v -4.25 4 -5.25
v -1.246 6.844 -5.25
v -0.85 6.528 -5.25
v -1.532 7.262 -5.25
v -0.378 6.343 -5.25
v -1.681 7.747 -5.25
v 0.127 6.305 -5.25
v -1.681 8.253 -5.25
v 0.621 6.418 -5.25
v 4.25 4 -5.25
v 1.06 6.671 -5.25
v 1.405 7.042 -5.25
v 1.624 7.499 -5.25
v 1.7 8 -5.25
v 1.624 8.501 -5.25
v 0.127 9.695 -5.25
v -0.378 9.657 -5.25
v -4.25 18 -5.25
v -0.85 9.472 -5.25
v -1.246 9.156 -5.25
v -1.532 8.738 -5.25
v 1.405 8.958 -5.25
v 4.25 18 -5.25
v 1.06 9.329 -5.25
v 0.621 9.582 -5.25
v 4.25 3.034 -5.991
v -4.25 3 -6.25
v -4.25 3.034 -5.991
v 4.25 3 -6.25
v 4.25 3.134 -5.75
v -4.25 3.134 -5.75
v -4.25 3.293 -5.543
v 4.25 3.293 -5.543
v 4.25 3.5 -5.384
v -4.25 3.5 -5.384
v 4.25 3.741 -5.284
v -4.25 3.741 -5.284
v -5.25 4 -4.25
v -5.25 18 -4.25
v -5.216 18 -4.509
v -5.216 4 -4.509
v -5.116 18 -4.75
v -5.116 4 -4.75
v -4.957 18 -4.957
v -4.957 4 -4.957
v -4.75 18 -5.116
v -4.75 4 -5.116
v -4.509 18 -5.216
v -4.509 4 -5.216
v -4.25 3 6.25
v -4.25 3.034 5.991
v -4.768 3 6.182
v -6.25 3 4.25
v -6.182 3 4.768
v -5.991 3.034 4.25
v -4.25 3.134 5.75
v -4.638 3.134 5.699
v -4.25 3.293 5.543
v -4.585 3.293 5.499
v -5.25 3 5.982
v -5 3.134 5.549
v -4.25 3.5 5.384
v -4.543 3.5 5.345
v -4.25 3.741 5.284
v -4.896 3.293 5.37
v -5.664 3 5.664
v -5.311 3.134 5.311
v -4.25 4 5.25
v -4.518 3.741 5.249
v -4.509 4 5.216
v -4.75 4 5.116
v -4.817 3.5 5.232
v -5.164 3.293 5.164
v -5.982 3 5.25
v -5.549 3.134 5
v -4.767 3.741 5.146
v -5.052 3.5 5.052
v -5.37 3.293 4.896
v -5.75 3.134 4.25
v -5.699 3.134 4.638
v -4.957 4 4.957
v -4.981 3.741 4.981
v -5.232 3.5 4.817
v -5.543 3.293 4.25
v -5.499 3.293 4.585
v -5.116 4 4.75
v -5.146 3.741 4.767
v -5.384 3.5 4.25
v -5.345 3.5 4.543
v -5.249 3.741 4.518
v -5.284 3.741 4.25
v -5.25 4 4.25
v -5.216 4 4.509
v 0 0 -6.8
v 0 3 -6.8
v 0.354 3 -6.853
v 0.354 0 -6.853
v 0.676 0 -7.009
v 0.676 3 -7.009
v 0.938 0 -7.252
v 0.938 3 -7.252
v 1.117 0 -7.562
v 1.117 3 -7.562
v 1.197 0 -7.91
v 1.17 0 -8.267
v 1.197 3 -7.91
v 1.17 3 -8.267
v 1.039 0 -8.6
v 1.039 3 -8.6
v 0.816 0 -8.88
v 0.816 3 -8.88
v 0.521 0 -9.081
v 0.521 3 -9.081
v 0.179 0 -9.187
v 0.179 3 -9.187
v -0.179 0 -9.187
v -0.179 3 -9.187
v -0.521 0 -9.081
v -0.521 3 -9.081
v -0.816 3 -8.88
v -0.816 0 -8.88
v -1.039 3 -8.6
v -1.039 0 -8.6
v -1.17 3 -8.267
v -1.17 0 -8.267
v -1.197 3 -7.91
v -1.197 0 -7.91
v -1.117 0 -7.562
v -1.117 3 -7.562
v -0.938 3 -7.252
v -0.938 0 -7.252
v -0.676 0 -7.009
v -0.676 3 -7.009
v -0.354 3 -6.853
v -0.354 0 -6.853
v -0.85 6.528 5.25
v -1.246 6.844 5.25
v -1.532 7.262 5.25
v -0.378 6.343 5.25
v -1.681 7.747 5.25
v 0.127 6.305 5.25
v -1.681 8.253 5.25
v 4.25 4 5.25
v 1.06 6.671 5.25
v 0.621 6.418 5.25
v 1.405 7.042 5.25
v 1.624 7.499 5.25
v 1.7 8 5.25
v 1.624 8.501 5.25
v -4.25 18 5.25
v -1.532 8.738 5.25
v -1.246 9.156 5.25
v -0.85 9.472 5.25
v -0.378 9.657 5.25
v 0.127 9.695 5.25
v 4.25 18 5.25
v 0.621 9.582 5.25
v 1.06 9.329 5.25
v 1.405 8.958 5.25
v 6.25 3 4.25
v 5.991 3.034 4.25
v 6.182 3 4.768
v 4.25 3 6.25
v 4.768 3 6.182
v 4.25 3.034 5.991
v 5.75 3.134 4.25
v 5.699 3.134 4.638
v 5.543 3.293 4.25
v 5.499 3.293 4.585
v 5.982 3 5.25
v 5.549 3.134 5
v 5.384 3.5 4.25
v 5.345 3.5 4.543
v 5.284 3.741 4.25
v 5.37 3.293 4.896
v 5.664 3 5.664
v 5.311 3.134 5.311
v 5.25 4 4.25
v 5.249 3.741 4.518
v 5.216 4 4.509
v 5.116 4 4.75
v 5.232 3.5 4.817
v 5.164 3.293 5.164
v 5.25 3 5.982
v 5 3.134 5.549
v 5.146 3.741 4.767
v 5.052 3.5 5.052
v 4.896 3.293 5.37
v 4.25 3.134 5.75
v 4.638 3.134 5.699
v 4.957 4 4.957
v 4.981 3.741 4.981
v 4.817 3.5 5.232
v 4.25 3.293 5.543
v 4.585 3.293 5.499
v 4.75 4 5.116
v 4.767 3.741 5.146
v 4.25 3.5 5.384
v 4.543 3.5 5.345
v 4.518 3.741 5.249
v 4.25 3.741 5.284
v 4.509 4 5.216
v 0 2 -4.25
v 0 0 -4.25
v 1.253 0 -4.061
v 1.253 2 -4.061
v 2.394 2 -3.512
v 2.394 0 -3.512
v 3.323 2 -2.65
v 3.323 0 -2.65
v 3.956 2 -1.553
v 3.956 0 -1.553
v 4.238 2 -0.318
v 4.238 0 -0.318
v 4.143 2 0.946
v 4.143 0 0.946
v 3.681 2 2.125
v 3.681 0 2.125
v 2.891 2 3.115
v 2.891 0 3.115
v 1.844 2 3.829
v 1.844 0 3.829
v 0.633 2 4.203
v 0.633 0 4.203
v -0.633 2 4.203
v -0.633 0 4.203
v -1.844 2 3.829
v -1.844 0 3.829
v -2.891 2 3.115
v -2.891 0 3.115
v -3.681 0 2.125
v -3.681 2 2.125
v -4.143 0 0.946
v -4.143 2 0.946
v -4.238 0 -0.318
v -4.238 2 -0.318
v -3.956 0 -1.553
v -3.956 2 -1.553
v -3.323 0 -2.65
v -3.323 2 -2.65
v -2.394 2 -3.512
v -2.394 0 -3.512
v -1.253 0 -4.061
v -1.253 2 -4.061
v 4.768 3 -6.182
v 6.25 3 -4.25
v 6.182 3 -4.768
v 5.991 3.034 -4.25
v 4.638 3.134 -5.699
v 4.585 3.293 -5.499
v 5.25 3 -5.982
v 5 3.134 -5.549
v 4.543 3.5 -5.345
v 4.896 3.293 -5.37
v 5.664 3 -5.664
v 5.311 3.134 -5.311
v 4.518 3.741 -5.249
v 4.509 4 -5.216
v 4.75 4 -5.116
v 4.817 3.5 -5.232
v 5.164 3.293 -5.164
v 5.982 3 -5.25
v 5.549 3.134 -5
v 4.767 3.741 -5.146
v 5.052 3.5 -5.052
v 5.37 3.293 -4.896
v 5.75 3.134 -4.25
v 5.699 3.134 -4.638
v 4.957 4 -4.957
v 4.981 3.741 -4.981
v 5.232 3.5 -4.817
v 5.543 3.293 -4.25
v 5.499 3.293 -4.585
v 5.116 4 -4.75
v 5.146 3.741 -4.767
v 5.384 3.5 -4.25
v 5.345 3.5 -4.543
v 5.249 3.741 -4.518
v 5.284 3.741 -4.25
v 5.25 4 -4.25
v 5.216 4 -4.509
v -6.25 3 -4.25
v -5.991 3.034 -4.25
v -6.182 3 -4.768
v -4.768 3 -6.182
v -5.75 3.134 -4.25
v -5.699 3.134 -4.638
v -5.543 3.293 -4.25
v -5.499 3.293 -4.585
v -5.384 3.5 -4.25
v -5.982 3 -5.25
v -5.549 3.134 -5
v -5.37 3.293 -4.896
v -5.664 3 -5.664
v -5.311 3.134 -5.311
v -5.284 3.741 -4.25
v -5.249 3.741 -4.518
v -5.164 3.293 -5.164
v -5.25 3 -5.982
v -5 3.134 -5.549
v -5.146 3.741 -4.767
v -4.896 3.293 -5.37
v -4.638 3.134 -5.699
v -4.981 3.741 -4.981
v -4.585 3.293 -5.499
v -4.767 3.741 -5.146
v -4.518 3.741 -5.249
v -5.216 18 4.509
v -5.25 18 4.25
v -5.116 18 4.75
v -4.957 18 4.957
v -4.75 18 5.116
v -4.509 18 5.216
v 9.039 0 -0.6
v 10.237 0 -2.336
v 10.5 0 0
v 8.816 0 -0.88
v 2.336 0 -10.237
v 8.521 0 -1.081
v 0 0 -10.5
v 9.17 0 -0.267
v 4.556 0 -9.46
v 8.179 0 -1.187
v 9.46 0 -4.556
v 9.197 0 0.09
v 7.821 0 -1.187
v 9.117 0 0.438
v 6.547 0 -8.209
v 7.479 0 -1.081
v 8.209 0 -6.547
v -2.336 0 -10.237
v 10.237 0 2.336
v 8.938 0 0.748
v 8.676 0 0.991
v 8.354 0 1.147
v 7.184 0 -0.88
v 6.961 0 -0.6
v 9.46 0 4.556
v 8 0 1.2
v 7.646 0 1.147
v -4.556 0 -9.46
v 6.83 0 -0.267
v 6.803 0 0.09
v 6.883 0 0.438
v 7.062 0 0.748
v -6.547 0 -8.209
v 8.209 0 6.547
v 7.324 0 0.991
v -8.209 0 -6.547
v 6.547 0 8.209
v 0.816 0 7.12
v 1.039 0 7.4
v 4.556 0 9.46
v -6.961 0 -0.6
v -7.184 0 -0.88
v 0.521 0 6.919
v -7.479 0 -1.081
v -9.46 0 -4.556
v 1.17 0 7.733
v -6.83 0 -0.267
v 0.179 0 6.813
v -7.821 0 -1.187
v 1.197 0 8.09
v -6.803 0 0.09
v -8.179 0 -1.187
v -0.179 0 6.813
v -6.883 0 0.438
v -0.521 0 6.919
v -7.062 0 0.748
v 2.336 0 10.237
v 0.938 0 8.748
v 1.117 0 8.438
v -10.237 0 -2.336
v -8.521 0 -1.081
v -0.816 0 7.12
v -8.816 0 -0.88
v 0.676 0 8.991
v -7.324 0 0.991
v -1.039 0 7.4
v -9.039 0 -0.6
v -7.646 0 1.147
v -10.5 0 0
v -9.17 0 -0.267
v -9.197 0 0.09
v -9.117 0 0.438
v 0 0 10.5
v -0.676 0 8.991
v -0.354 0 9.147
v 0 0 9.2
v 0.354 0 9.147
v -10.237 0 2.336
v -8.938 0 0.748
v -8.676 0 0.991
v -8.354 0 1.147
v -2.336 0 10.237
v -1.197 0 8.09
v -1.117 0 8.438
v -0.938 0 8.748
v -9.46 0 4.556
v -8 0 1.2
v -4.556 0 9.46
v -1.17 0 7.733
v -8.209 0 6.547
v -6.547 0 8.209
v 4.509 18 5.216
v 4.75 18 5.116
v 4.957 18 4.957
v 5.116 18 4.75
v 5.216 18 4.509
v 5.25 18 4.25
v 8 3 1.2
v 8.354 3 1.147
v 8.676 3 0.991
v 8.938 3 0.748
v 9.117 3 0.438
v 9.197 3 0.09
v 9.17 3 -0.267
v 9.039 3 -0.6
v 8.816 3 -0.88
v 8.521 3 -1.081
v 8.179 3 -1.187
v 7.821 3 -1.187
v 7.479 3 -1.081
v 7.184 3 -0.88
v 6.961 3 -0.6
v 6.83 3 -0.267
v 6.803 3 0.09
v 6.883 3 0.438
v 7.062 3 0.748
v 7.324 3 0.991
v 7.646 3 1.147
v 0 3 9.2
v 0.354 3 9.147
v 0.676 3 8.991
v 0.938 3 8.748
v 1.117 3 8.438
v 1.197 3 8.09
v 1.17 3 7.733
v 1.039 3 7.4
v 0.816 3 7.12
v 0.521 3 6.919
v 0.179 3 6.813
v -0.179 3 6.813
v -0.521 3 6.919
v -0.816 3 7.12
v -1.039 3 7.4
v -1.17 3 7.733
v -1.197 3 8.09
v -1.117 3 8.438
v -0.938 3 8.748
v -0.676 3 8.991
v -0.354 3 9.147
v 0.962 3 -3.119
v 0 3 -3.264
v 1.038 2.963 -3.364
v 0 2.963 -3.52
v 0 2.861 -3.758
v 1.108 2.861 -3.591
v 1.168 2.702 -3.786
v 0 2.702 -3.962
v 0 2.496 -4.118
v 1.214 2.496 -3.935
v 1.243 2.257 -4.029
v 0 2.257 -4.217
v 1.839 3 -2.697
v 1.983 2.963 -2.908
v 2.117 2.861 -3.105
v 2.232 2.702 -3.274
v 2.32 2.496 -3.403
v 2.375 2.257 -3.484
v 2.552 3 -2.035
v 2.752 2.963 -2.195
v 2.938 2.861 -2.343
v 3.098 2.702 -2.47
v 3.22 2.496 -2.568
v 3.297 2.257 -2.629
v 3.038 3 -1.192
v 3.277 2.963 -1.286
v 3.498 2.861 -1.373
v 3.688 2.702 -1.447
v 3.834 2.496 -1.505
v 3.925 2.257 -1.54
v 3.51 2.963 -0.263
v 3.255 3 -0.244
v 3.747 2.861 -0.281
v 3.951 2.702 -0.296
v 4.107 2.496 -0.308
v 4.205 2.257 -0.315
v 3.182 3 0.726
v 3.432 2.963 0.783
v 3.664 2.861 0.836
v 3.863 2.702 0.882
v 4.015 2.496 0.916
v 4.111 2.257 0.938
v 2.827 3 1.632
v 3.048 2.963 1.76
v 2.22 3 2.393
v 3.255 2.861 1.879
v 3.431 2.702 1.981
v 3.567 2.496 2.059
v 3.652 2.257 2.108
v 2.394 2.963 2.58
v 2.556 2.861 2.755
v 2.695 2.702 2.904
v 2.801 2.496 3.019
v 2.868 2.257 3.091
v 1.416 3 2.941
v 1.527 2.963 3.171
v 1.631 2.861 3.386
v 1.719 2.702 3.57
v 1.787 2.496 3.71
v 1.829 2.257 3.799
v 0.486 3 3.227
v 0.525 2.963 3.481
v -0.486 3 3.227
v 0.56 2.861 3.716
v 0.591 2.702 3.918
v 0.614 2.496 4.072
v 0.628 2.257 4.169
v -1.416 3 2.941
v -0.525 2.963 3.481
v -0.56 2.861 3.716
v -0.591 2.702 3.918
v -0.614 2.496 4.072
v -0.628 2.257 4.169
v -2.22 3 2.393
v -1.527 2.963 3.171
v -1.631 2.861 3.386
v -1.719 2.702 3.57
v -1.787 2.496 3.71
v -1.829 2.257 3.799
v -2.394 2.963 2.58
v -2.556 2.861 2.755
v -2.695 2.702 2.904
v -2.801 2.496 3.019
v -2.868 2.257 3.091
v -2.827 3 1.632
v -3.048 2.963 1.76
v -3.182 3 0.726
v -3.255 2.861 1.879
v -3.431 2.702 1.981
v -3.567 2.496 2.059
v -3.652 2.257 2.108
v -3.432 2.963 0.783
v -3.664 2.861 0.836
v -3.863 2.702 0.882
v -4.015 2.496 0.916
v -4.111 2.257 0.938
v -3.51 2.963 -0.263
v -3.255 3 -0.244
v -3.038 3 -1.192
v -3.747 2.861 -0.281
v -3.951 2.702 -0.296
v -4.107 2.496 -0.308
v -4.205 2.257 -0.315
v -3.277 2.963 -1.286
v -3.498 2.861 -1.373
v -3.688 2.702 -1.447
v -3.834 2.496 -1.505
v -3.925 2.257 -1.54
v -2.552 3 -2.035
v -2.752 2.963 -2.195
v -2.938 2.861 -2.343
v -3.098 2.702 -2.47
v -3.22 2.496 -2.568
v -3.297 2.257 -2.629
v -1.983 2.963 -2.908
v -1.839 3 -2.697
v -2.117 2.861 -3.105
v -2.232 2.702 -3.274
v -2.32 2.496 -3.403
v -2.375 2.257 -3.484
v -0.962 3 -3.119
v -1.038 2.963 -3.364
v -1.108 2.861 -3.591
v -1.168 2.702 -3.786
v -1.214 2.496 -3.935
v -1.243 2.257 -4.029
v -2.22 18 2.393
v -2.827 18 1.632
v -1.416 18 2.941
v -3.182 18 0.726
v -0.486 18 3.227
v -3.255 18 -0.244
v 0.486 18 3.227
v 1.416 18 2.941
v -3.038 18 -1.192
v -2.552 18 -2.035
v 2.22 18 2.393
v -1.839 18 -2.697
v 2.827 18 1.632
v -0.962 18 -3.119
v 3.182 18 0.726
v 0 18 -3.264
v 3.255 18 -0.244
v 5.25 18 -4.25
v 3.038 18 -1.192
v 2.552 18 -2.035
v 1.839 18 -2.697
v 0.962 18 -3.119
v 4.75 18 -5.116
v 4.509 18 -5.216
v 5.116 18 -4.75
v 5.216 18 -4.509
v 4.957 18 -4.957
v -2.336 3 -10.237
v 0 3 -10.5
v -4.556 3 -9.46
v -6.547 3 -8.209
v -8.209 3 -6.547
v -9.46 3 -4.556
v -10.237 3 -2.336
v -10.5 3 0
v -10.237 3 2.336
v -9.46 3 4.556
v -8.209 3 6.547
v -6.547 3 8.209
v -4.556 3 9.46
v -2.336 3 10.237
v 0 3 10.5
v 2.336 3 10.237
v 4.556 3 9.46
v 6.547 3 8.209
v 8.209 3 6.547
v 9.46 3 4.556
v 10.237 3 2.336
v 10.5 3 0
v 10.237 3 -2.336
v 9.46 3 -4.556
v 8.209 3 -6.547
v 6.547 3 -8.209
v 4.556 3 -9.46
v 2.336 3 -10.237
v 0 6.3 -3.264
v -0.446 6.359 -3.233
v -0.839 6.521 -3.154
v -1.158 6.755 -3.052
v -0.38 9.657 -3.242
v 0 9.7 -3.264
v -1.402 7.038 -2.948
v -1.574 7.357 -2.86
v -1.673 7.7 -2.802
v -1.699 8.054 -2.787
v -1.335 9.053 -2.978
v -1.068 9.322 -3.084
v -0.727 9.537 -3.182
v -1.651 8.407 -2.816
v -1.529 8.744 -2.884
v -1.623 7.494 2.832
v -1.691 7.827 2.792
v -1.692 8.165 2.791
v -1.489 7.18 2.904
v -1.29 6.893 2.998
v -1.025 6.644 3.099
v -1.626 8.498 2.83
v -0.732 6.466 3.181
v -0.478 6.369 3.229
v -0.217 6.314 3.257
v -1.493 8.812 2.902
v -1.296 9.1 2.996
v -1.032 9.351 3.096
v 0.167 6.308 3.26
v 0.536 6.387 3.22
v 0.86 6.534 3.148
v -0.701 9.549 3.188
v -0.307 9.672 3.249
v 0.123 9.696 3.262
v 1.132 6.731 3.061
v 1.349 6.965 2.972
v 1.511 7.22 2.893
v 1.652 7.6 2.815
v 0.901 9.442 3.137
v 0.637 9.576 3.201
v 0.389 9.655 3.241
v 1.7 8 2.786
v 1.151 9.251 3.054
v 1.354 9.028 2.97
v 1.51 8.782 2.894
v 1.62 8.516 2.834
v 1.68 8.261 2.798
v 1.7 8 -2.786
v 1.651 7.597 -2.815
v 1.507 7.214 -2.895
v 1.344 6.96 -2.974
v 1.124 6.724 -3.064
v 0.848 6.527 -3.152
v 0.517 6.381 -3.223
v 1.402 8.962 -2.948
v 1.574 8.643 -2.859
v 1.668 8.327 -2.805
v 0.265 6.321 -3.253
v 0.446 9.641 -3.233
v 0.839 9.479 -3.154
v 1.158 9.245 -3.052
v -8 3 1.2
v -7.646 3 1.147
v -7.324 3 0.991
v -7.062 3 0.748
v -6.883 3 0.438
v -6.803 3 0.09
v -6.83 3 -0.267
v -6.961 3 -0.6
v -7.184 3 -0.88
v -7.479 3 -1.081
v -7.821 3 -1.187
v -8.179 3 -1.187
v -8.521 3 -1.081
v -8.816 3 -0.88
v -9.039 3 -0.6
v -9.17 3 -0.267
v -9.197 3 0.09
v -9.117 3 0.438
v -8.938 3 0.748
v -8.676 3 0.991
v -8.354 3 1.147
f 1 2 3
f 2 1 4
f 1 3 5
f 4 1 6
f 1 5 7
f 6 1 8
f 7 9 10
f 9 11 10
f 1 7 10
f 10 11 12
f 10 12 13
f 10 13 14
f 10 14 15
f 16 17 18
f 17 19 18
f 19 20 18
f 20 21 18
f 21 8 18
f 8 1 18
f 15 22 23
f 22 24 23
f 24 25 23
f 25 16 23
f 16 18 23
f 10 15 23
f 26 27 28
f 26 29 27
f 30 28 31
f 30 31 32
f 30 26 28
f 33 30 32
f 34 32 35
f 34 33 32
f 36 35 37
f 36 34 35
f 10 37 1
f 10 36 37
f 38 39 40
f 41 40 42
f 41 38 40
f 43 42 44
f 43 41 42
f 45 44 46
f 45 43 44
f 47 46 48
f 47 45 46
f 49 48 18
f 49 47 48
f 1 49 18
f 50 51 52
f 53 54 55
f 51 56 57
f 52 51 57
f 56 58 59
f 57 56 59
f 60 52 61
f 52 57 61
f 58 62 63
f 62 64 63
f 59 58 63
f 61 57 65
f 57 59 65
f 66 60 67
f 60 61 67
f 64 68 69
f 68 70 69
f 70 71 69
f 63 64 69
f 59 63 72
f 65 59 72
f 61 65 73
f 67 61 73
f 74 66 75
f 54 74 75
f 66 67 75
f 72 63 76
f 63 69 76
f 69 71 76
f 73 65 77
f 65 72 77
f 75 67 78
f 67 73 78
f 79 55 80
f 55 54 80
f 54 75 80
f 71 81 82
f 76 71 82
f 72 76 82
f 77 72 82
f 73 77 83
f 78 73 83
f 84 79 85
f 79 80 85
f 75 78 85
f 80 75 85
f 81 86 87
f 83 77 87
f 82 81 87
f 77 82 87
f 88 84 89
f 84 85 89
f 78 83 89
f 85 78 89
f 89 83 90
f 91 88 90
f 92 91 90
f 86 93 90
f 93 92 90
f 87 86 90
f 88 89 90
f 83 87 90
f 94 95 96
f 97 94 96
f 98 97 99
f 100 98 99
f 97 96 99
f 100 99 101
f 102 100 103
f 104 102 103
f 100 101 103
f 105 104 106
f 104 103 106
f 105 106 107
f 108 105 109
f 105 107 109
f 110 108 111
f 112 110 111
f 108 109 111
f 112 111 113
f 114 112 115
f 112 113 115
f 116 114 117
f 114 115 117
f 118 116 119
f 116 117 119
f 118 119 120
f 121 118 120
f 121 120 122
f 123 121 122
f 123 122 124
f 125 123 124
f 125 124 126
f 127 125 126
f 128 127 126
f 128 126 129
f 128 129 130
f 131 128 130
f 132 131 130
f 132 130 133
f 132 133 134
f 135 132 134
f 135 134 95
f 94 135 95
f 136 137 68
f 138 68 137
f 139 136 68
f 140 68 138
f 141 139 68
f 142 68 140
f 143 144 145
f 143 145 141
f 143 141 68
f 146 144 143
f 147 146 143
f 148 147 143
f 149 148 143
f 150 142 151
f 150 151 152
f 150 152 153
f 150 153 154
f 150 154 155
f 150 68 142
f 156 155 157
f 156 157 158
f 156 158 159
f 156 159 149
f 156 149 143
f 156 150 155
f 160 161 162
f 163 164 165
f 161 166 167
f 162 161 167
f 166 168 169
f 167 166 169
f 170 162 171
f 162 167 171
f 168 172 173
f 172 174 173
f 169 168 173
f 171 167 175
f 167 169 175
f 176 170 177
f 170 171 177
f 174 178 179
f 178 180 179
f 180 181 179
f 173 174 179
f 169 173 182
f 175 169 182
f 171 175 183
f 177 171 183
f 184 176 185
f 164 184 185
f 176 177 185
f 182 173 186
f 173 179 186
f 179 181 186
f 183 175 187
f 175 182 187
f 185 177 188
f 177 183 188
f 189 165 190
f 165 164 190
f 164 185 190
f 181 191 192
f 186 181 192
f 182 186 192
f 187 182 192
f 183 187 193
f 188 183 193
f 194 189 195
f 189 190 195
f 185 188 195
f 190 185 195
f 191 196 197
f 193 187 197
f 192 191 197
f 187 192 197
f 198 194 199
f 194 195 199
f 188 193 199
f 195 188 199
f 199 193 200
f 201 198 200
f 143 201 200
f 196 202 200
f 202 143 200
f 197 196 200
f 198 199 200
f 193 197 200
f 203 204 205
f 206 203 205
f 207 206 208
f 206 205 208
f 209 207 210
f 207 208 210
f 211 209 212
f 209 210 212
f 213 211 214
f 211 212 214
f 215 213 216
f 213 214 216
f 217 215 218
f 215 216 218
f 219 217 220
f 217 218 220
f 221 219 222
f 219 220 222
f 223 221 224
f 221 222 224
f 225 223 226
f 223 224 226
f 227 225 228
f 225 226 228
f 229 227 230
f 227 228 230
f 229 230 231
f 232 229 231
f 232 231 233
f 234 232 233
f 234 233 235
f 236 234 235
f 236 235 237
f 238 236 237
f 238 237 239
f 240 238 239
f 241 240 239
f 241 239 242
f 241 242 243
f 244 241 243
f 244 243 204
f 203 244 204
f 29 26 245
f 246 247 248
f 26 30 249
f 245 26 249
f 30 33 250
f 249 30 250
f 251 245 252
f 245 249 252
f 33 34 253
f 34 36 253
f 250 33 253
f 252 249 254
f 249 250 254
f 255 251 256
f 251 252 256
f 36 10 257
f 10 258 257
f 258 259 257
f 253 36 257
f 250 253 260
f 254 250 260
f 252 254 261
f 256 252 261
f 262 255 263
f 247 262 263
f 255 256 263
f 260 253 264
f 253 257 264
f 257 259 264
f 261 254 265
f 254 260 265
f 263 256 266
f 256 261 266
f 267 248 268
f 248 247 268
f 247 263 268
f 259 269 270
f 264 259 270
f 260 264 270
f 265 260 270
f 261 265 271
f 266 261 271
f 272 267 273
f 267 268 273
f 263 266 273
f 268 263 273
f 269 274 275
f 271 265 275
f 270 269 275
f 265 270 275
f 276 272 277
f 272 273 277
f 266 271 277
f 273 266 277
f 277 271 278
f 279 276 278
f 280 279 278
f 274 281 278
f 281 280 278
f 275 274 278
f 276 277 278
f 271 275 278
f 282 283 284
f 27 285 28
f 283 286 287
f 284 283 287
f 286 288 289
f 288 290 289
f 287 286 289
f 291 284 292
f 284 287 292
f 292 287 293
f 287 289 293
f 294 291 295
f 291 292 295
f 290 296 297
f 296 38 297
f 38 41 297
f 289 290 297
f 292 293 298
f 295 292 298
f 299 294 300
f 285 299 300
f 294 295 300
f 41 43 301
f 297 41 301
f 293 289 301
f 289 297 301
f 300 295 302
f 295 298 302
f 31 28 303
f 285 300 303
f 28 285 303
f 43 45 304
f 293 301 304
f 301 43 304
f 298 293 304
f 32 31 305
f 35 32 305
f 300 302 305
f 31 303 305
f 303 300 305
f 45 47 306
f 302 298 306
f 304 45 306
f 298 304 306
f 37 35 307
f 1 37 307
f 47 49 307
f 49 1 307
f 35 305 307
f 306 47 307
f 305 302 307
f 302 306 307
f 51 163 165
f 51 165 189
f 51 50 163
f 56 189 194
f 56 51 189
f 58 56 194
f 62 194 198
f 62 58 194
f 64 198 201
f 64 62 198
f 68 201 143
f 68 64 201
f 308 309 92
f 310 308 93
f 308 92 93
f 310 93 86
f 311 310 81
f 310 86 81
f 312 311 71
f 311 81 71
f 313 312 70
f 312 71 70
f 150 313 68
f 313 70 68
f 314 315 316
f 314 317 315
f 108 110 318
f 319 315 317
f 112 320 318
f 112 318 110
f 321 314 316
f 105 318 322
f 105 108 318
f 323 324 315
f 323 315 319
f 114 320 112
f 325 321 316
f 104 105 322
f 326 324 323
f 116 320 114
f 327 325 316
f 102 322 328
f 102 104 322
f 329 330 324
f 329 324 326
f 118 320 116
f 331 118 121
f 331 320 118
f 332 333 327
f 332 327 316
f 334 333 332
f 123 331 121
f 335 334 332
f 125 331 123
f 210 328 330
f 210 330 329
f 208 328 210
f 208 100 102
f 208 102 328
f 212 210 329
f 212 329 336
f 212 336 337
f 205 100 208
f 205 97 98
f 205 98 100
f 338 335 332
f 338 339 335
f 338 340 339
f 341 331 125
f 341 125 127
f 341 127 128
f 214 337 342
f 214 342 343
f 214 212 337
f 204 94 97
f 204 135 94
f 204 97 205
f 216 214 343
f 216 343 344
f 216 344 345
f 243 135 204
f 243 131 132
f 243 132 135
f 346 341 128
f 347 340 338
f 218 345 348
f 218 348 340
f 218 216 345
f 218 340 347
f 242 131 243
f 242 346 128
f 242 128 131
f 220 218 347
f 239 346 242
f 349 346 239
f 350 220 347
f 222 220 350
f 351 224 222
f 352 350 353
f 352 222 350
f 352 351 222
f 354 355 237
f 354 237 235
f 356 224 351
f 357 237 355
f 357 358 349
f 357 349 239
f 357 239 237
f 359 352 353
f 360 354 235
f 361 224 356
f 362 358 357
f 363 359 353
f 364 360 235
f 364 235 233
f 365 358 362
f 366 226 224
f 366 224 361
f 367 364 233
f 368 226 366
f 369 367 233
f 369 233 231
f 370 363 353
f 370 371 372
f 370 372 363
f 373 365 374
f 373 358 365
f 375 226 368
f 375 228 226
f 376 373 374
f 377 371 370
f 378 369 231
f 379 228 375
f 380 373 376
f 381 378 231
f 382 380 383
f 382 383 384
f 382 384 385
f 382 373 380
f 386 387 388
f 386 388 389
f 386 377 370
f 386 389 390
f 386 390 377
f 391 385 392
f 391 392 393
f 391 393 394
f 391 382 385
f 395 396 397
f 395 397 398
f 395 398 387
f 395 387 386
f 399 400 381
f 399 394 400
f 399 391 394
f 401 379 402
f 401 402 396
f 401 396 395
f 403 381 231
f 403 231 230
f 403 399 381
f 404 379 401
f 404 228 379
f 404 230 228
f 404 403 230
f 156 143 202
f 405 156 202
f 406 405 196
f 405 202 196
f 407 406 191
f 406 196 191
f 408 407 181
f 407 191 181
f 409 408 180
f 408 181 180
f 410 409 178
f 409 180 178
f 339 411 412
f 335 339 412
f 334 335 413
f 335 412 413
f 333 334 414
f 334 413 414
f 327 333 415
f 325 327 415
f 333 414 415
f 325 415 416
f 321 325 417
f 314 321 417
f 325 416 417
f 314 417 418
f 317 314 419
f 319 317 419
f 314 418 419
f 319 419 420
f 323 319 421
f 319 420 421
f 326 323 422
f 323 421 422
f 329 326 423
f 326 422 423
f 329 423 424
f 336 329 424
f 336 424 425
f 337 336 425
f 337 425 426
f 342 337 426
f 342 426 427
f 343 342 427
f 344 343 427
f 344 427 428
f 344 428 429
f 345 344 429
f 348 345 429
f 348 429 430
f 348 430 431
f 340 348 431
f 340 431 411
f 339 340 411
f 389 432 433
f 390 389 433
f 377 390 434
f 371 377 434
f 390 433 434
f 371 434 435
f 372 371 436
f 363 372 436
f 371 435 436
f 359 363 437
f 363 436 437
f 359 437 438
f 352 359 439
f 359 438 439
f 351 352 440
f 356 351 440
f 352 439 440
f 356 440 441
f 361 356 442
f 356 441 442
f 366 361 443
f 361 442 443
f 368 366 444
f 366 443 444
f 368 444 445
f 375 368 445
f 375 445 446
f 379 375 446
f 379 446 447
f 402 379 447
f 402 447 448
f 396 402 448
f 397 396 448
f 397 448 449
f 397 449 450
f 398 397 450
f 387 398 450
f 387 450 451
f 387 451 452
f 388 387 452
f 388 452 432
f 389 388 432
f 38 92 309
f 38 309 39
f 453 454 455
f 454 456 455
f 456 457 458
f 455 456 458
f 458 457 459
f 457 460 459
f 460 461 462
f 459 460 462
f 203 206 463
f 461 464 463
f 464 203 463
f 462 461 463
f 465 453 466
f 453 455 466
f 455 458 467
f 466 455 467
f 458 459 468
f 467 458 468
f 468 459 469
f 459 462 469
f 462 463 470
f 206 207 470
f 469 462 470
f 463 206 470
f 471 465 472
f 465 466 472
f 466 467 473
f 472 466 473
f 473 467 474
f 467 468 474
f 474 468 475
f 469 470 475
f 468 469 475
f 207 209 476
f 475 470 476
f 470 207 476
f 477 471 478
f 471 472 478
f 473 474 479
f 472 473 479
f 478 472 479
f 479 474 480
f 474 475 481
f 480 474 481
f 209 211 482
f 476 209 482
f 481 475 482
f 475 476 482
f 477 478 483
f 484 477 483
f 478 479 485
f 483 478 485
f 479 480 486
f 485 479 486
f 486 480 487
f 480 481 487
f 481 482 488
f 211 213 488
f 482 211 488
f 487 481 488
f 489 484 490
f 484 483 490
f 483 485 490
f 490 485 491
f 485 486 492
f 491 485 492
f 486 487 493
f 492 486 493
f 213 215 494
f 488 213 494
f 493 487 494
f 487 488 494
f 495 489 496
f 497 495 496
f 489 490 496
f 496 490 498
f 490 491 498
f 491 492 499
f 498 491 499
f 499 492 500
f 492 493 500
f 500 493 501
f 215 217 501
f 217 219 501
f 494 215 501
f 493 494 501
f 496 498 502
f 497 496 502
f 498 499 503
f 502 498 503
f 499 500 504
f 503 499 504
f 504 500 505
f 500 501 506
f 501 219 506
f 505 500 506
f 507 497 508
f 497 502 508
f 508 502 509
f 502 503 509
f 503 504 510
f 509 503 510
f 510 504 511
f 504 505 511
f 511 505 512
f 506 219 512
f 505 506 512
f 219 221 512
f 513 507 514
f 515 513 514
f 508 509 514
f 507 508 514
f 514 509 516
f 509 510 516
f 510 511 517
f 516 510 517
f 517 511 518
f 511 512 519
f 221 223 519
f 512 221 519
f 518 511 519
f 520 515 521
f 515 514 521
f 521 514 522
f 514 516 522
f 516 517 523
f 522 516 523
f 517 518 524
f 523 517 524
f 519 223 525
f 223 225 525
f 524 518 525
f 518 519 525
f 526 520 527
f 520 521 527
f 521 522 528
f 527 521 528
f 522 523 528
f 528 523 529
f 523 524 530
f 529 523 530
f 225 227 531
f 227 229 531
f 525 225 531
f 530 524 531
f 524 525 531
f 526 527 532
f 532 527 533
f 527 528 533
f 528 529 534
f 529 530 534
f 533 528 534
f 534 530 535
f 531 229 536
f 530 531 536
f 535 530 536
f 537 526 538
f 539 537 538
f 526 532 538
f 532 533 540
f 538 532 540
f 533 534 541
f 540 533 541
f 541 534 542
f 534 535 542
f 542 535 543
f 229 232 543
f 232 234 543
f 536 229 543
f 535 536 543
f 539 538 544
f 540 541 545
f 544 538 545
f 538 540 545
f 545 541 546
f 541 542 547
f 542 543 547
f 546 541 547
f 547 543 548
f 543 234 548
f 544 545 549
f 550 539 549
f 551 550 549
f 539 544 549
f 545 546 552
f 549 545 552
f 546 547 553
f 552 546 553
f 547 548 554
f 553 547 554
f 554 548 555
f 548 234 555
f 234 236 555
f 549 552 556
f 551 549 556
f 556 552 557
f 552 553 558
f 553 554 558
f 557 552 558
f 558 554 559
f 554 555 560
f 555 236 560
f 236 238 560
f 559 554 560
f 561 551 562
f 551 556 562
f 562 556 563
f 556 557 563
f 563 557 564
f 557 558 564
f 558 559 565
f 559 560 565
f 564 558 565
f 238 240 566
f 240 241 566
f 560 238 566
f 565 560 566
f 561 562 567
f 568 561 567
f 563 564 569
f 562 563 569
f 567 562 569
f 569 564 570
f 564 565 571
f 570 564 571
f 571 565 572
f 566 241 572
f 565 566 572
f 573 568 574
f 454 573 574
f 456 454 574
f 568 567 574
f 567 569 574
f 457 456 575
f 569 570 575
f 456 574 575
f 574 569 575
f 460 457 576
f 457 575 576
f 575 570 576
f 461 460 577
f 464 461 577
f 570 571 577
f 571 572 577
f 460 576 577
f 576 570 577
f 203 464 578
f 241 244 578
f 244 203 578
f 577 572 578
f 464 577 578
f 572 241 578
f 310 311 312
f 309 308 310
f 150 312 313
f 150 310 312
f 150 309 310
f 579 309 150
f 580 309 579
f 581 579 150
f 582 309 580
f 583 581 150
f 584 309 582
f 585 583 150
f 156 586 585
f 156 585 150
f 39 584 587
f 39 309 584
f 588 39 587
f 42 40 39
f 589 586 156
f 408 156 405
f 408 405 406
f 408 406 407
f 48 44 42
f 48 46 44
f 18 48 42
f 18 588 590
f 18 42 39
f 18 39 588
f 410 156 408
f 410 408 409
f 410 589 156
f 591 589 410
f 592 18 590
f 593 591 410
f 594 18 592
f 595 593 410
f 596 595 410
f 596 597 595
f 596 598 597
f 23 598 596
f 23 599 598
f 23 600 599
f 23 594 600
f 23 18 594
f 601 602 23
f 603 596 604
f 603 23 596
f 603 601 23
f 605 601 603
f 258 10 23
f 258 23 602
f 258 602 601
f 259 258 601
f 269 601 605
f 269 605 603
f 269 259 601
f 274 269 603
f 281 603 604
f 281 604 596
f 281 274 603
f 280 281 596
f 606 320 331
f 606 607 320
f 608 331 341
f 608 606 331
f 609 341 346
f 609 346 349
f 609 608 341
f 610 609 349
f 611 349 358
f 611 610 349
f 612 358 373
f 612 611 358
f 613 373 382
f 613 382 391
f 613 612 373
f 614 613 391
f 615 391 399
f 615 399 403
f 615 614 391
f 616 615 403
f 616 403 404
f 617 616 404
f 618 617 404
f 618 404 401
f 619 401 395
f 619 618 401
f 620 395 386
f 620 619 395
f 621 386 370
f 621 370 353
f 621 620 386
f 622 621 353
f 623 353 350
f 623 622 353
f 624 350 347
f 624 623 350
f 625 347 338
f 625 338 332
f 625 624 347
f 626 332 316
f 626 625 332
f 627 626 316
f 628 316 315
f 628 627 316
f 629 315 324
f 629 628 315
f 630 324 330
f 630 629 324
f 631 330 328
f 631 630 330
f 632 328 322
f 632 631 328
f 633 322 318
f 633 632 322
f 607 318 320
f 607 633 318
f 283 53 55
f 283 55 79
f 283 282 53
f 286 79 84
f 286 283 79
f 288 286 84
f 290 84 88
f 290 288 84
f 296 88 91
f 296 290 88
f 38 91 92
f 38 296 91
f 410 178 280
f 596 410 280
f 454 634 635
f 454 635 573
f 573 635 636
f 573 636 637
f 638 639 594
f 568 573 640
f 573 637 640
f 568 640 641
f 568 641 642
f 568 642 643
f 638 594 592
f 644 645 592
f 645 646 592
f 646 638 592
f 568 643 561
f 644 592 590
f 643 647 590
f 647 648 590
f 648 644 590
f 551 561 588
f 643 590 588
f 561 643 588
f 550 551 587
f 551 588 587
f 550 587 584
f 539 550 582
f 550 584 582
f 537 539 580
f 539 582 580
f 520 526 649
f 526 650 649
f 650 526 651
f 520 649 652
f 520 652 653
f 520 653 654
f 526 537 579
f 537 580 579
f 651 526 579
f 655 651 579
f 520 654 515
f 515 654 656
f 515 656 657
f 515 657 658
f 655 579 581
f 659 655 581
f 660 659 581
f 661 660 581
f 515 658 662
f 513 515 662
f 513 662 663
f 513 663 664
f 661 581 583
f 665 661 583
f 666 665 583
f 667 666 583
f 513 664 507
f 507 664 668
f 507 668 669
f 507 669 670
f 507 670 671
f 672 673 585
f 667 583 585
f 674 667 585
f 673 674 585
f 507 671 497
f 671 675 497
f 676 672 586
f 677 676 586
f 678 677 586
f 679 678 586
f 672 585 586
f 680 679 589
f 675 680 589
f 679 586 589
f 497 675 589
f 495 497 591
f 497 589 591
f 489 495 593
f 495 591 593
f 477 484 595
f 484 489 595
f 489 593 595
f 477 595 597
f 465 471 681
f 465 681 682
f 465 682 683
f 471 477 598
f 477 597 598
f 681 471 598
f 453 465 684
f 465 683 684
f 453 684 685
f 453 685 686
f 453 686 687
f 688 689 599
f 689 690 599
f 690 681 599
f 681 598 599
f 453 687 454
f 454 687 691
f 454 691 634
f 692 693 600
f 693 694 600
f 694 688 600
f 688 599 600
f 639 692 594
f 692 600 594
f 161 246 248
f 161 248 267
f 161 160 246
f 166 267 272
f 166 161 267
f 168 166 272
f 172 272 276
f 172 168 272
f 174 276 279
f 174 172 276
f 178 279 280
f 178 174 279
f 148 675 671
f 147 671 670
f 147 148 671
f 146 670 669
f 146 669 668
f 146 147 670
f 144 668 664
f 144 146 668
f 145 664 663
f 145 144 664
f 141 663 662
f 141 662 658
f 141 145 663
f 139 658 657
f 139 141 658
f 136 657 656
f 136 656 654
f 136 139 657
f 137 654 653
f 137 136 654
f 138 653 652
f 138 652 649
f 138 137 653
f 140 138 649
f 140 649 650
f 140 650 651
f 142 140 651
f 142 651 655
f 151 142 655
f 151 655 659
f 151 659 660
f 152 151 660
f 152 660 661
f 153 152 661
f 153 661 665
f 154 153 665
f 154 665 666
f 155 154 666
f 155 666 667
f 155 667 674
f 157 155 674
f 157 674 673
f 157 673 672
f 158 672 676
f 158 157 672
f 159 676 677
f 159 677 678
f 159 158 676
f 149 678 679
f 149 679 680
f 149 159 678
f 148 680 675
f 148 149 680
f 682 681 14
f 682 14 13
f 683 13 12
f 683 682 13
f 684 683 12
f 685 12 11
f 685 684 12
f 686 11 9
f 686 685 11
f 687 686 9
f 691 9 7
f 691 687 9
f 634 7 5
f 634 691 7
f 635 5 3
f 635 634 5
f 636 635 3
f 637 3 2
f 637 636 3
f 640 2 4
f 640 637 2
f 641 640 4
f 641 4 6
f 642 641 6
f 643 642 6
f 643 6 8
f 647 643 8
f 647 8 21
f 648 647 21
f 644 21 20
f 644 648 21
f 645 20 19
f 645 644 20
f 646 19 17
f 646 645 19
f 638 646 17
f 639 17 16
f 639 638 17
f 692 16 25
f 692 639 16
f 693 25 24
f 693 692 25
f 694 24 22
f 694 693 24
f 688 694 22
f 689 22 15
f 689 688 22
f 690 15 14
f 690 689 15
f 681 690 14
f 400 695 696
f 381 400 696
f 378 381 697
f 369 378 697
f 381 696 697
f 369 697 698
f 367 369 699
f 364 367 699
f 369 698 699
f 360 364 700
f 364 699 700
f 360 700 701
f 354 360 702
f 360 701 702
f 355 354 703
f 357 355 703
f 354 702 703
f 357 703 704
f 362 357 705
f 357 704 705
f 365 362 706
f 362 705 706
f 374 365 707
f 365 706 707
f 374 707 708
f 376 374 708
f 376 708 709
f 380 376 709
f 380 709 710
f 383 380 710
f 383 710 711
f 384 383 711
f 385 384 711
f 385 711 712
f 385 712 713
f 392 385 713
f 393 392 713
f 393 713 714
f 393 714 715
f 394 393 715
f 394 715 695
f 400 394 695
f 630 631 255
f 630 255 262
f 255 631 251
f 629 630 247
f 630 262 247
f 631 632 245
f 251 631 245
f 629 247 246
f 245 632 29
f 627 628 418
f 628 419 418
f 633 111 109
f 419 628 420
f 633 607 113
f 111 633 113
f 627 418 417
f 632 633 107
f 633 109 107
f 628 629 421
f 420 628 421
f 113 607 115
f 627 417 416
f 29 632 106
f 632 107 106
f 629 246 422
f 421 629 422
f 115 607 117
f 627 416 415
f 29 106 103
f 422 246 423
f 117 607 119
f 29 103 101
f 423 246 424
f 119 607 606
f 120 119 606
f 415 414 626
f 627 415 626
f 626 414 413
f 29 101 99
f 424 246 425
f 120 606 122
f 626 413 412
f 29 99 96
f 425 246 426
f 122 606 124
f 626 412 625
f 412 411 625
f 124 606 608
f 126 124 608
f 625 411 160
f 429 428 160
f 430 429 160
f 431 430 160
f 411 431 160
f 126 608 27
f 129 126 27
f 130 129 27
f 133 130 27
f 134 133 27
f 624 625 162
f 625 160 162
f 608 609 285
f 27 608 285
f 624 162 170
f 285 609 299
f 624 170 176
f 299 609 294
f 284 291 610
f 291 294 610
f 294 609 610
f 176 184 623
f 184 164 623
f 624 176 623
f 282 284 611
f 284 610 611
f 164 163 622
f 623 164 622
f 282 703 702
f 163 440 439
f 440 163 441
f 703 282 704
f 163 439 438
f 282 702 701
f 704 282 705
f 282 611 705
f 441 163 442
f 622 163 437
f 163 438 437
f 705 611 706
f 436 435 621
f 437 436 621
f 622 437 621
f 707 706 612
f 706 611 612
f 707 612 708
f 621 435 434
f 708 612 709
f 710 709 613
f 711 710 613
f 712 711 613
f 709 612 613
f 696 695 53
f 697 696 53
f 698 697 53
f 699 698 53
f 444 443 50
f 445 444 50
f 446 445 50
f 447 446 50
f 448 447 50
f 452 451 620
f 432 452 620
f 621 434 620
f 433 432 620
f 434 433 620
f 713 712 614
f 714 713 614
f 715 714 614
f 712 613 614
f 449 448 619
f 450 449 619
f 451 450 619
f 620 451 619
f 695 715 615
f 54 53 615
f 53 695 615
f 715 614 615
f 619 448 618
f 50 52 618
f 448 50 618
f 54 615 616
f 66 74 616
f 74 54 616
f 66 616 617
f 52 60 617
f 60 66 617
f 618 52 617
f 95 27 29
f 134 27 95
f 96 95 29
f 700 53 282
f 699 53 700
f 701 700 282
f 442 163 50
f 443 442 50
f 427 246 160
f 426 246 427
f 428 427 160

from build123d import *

# Parameters (mm, degrees)
SKETCH1_W           = 7.2361
SKETCH1_H           = 3
BOSS_EXTRUDE1_START = 15
SKETCH7_W           = 10.5
SKETCH7_H           = 10.5
SKETCH7_R           = 3.2639
BOSS_EXTRUDE1_DEPTH = 15
SKETCH3_R           = 1.7
CUT_EXTRUDE1_DEPTH  = 33.886404519
SKETCH4_R           = 1.2
CUT_EXTRUDE2_DEPTH  = 22.10687099
FILLET1_R           = 1
FILLET2_R           = 1
SKETCH8_R           = 4.25
CUT_EXTRUDE3_DEPTH  = 3
FILLET3_R           = 1


with BuildPart() as part:
    # Sketch1 → Revolve1 (revolve)
    with BuildSketch(Plane.XY, mode=Mode.PRIVATE) as revolve1_sk:
        with Locations((6.88195, 1.5)):
            Rectangle(SKETCH1_W, SKETCH1_H)
    revolve(revolve1_sk.sketch.rotate(Axis((0, 0, 0), (0, 1, 0)), 90), axis=Axis((0, 0, 0), (0, 1, 0)))

    # Sketch7 → Boss-Extrude1 (add)
    with BuildSketch(Plane(origin=(0, 3, 0), x_dir=(1, 0, 0), z_dir=(0, 1, 0)).offset(BOSS_EXTRUDE1_START)):
        Rectangle(SKETCH7_W, SKETCH7_H)
        with Locations(Location((0, 0, 0), (0, 0, 90))):
            Circle(SKETCH7_R, mode=Mode.SUBTRACT)
    extrude(amount=-BOSS_EXTRUDE1_DEPTH)

    # Sketch3 → Cut-Extrude1 (cut, through all)
    with BuildSketch(Plane(origin=(12.071067812, 0, 5.25), x_dir=(-1, 0, 0), z_dir=(0, 0, -1))):
        with Locations(Location((12.071067812, 8, 0), (0, 0, 180))):
            Circle(SKETCH3_R)
    extrude(amount=CUT_EXTRUDE1_DEPTH, mode=Mode.SUBTRACT)

    # Sketch4 → Cut-Extrude2 (cut, through all)
    with BuildSketch(Plane(origin=(0, 3, 0), x_dir=(1, 0, 0), z_dir=(0, 1, 0))):
        with Locations(Location((0, 8, 0), (0, 0, 270))):
            Circle(SKETCH4_R)
        with Locations(Location((8, 0, 0), (0, 0, 270))):
            Circle(SKETCH4_R)
        with Locations(Location((0, -8, 0), (0, 0, 270))):
            Circle(SKETCH4_R)
        with Locations(Location((-8, 0, 0), (0, 0, 270))):
            Circle(SKETCH4_R)
    extrude(amount=-CUT_EXTRUDE2_DEPTH, mode=Mode.SUBTRACT)

    # Fillet1
    fillet1_edges = [part.edges().sort_by_distance(p)[0] for p in [
        (5.25, 10.5, 5.25),
        (5.25, 10.5, -5.25),
        (-5.25, 10.5, -5.25),
        (-5.25, 10.5, 5.25),
    ]]
    fillet(fillet1_edges, radius=FILLET1_R)

    # Fillet2
    fillet2_edges = [part.edges().sort_by_distance(p)[0] for p in [
        (0, 3, -5.25),
        (5.25, 3, 0),
        (-5.25, 3, 0),
        (0, 3, 5.25),
        (4.957106781, 3, -4.957106781),
        (-4.957106781, 3, -4.957106781),
        (4.957106781, 3, 4.957106781),
        (-4.957106781, 3, 4.957106781),
    ]]
    fillet(fillet2_edges, radius=FILLET2_R)

    # Sketch8 → Cut-Extrude3 (cut)
    with BuildSketch(Plane.XZ):
        with Locations(Location((0, 0, 0), (0, 0, 270))):
            Circle(SKETCH8_R)
    extrude(amount=-CUT_EXTRUDE3_DEPTH, mode=Mode.SUBTRACT)

    # Fillet3
    # the kernel refuses this fillet: 1 mm, written as the material it adds along each edge
    with BuildSketch(Plane(origin=(0, 3, 0), x_dir=(0, 0, -1), z_dir=(-1, 0, 0))) as fillet3_piece_1_section:
        with BuildLine():
            CenterArc((4.25 - FILLET3_R, FILLET3_R), FILLET3_R, 270, 90)
            Line((4.25 - FILLET3_R, 0), (4.25, 0))
            Line((4.25, 0), (4.25, FILLET3_R))
        make_face()
    fillet3_piece_1 = revolve(axis=Axis((0, 3, 0), (0, -1, 0)), mode=Mode.PRIVATE)
    fillet3_piece_1 = fillet3_piece_1 - Plane(origin=(0, 2.715239817, 0), x_dir=(0, 0, -1), z_dir=(0, 1, 0)) * Cylinder(3.2639, 17, mode=Mode.PRIVATE)
    add(fillet3_piece_1)


solid = part.part
